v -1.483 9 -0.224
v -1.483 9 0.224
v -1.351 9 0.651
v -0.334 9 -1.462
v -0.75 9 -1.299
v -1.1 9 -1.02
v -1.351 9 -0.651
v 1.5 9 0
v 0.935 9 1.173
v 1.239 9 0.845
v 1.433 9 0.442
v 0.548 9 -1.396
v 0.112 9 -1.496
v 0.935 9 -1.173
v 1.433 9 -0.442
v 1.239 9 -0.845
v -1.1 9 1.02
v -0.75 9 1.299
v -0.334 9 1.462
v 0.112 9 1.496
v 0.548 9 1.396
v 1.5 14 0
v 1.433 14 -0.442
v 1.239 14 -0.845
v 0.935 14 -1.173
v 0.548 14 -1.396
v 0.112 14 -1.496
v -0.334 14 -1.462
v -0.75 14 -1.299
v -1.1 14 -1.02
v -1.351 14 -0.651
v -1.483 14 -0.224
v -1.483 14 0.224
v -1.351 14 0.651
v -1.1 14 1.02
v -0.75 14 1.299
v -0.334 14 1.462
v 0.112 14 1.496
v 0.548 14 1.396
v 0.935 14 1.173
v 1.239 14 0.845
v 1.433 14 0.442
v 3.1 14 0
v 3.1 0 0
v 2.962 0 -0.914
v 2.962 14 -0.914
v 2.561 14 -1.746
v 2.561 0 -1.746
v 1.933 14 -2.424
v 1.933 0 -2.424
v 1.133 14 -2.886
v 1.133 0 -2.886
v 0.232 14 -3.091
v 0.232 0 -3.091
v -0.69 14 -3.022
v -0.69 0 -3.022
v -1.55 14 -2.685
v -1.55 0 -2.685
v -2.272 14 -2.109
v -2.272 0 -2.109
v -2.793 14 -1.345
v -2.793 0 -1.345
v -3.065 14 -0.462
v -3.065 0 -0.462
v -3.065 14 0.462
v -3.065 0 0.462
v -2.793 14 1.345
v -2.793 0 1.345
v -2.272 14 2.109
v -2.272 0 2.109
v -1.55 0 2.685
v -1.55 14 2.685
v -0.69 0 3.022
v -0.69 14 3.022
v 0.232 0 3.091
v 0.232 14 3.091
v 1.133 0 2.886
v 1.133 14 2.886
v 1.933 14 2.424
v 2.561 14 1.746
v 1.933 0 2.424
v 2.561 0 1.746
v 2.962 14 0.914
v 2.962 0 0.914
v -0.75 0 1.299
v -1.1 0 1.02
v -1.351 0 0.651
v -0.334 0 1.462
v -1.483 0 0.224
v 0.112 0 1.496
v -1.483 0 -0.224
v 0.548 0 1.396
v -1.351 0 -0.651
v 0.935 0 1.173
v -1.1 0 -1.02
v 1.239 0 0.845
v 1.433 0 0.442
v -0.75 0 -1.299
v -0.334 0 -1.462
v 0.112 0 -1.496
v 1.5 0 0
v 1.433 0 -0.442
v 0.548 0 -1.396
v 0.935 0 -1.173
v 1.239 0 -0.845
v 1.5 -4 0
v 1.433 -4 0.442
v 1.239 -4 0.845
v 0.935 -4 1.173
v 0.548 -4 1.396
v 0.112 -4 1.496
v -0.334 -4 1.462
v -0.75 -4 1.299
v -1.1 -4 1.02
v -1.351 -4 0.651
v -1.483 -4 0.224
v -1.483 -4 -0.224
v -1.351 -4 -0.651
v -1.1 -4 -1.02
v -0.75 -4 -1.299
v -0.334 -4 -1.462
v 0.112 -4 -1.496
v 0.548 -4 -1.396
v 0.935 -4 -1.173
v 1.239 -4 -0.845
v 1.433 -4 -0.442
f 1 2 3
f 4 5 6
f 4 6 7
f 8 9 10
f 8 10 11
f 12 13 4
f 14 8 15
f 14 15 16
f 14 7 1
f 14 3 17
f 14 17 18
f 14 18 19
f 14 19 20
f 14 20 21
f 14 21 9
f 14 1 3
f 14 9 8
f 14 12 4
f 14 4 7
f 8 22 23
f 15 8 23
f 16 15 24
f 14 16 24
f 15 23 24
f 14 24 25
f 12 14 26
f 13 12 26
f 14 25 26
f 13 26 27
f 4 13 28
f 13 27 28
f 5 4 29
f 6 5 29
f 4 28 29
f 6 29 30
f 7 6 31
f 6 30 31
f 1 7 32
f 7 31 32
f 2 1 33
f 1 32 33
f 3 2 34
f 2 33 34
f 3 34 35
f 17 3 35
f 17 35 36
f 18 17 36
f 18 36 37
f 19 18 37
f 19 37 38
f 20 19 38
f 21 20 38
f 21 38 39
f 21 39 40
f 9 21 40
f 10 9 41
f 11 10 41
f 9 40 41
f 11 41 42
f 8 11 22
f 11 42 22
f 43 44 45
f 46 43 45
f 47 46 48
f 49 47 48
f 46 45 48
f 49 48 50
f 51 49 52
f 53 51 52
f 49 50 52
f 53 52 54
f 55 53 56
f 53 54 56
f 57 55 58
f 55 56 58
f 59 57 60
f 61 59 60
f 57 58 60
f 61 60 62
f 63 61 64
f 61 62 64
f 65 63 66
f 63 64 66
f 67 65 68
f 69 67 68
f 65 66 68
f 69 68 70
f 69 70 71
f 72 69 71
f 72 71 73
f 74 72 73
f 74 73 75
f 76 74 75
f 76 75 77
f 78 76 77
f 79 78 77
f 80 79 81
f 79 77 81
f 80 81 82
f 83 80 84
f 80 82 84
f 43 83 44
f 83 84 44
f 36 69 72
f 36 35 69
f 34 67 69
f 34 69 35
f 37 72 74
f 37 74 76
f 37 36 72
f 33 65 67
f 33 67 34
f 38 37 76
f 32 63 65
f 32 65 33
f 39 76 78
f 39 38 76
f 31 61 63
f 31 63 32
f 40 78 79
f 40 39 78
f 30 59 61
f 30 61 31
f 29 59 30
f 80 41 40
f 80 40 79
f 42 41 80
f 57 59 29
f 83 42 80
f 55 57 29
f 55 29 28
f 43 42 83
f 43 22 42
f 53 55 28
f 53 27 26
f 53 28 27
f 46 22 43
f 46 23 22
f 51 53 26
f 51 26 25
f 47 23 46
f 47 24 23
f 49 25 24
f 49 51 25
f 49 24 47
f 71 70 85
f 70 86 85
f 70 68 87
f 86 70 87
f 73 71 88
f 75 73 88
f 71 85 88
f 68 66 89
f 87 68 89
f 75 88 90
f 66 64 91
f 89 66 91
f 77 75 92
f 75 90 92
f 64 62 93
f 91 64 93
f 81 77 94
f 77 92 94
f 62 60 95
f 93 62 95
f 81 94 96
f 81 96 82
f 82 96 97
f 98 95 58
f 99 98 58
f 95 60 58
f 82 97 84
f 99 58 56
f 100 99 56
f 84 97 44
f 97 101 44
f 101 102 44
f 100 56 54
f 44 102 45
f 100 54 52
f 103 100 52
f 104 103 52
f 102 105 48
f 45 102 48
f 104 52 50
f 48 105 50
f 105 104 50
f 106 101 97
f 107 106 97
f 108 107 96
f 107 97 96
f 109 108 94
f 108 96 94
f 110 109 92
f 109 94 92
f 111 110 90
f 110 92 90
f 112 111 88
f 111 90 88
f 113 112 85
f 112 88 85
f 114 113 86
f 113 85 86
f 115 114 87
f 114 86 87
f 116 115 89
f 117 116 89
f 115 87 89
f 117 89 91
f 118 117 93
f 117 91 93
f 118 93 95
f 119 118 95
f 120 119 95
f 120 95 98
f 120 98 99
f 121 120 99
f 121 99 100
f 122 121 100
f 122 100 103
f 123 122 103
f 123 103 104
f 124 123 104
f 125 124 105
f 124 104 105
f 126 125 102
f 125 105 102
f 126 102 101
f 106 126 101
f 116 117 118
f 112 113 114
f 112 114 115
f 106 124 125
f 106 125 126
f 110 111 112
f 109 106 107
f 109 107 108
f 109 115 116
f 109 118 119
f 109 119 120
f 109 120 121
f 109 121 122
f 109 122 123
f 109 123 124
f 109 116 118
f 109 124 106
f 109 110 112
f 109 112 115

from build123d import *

# Parameters (mm, degrees)
SKETCH1_R           = 3.1
BOSS_EXTRUDE1_DEPTH = 14
SKETCH2_R           = 1.5
CUT_EXTRUDE1_DEPTH  = 5
SKETCH3_R           = 1.5
BOSS_EXTRUDE2_DEPTH = 4


with BuildPart() as part:
    # Sketch1 → Boss-Extrude1 (new body)
    with BuildSketch(Plane(origin=(0, 0, 0), x_dir=(1, 0, 0), z_dir=(0, 1, 0))):
        Circle(SKETCH1_R)
    extrude(amount=BOSS_EXTRUDE1_DEPTH)

    # Sketch2 → Cut-Extrude1 (cut)
    with BuildSketch(Plane(origin=(0, 14, 0), x_dir=(1, 0, 0), z_dir=(0, 1, 0))):
        Circle(SKETCH2_R)
    extrude(amount=-CUT_EXTRUDE1_DEPTH, mode=Mode.SUBTRACT)

    # Sketch3 → Boss-Extrude2 (add)
    with BuildSketch(Plane.XZ):
        Circle(SKETCH3_R)
    extrude(amount=BOSS_EXTRUDE2_DEPTH)


solid = part.part
